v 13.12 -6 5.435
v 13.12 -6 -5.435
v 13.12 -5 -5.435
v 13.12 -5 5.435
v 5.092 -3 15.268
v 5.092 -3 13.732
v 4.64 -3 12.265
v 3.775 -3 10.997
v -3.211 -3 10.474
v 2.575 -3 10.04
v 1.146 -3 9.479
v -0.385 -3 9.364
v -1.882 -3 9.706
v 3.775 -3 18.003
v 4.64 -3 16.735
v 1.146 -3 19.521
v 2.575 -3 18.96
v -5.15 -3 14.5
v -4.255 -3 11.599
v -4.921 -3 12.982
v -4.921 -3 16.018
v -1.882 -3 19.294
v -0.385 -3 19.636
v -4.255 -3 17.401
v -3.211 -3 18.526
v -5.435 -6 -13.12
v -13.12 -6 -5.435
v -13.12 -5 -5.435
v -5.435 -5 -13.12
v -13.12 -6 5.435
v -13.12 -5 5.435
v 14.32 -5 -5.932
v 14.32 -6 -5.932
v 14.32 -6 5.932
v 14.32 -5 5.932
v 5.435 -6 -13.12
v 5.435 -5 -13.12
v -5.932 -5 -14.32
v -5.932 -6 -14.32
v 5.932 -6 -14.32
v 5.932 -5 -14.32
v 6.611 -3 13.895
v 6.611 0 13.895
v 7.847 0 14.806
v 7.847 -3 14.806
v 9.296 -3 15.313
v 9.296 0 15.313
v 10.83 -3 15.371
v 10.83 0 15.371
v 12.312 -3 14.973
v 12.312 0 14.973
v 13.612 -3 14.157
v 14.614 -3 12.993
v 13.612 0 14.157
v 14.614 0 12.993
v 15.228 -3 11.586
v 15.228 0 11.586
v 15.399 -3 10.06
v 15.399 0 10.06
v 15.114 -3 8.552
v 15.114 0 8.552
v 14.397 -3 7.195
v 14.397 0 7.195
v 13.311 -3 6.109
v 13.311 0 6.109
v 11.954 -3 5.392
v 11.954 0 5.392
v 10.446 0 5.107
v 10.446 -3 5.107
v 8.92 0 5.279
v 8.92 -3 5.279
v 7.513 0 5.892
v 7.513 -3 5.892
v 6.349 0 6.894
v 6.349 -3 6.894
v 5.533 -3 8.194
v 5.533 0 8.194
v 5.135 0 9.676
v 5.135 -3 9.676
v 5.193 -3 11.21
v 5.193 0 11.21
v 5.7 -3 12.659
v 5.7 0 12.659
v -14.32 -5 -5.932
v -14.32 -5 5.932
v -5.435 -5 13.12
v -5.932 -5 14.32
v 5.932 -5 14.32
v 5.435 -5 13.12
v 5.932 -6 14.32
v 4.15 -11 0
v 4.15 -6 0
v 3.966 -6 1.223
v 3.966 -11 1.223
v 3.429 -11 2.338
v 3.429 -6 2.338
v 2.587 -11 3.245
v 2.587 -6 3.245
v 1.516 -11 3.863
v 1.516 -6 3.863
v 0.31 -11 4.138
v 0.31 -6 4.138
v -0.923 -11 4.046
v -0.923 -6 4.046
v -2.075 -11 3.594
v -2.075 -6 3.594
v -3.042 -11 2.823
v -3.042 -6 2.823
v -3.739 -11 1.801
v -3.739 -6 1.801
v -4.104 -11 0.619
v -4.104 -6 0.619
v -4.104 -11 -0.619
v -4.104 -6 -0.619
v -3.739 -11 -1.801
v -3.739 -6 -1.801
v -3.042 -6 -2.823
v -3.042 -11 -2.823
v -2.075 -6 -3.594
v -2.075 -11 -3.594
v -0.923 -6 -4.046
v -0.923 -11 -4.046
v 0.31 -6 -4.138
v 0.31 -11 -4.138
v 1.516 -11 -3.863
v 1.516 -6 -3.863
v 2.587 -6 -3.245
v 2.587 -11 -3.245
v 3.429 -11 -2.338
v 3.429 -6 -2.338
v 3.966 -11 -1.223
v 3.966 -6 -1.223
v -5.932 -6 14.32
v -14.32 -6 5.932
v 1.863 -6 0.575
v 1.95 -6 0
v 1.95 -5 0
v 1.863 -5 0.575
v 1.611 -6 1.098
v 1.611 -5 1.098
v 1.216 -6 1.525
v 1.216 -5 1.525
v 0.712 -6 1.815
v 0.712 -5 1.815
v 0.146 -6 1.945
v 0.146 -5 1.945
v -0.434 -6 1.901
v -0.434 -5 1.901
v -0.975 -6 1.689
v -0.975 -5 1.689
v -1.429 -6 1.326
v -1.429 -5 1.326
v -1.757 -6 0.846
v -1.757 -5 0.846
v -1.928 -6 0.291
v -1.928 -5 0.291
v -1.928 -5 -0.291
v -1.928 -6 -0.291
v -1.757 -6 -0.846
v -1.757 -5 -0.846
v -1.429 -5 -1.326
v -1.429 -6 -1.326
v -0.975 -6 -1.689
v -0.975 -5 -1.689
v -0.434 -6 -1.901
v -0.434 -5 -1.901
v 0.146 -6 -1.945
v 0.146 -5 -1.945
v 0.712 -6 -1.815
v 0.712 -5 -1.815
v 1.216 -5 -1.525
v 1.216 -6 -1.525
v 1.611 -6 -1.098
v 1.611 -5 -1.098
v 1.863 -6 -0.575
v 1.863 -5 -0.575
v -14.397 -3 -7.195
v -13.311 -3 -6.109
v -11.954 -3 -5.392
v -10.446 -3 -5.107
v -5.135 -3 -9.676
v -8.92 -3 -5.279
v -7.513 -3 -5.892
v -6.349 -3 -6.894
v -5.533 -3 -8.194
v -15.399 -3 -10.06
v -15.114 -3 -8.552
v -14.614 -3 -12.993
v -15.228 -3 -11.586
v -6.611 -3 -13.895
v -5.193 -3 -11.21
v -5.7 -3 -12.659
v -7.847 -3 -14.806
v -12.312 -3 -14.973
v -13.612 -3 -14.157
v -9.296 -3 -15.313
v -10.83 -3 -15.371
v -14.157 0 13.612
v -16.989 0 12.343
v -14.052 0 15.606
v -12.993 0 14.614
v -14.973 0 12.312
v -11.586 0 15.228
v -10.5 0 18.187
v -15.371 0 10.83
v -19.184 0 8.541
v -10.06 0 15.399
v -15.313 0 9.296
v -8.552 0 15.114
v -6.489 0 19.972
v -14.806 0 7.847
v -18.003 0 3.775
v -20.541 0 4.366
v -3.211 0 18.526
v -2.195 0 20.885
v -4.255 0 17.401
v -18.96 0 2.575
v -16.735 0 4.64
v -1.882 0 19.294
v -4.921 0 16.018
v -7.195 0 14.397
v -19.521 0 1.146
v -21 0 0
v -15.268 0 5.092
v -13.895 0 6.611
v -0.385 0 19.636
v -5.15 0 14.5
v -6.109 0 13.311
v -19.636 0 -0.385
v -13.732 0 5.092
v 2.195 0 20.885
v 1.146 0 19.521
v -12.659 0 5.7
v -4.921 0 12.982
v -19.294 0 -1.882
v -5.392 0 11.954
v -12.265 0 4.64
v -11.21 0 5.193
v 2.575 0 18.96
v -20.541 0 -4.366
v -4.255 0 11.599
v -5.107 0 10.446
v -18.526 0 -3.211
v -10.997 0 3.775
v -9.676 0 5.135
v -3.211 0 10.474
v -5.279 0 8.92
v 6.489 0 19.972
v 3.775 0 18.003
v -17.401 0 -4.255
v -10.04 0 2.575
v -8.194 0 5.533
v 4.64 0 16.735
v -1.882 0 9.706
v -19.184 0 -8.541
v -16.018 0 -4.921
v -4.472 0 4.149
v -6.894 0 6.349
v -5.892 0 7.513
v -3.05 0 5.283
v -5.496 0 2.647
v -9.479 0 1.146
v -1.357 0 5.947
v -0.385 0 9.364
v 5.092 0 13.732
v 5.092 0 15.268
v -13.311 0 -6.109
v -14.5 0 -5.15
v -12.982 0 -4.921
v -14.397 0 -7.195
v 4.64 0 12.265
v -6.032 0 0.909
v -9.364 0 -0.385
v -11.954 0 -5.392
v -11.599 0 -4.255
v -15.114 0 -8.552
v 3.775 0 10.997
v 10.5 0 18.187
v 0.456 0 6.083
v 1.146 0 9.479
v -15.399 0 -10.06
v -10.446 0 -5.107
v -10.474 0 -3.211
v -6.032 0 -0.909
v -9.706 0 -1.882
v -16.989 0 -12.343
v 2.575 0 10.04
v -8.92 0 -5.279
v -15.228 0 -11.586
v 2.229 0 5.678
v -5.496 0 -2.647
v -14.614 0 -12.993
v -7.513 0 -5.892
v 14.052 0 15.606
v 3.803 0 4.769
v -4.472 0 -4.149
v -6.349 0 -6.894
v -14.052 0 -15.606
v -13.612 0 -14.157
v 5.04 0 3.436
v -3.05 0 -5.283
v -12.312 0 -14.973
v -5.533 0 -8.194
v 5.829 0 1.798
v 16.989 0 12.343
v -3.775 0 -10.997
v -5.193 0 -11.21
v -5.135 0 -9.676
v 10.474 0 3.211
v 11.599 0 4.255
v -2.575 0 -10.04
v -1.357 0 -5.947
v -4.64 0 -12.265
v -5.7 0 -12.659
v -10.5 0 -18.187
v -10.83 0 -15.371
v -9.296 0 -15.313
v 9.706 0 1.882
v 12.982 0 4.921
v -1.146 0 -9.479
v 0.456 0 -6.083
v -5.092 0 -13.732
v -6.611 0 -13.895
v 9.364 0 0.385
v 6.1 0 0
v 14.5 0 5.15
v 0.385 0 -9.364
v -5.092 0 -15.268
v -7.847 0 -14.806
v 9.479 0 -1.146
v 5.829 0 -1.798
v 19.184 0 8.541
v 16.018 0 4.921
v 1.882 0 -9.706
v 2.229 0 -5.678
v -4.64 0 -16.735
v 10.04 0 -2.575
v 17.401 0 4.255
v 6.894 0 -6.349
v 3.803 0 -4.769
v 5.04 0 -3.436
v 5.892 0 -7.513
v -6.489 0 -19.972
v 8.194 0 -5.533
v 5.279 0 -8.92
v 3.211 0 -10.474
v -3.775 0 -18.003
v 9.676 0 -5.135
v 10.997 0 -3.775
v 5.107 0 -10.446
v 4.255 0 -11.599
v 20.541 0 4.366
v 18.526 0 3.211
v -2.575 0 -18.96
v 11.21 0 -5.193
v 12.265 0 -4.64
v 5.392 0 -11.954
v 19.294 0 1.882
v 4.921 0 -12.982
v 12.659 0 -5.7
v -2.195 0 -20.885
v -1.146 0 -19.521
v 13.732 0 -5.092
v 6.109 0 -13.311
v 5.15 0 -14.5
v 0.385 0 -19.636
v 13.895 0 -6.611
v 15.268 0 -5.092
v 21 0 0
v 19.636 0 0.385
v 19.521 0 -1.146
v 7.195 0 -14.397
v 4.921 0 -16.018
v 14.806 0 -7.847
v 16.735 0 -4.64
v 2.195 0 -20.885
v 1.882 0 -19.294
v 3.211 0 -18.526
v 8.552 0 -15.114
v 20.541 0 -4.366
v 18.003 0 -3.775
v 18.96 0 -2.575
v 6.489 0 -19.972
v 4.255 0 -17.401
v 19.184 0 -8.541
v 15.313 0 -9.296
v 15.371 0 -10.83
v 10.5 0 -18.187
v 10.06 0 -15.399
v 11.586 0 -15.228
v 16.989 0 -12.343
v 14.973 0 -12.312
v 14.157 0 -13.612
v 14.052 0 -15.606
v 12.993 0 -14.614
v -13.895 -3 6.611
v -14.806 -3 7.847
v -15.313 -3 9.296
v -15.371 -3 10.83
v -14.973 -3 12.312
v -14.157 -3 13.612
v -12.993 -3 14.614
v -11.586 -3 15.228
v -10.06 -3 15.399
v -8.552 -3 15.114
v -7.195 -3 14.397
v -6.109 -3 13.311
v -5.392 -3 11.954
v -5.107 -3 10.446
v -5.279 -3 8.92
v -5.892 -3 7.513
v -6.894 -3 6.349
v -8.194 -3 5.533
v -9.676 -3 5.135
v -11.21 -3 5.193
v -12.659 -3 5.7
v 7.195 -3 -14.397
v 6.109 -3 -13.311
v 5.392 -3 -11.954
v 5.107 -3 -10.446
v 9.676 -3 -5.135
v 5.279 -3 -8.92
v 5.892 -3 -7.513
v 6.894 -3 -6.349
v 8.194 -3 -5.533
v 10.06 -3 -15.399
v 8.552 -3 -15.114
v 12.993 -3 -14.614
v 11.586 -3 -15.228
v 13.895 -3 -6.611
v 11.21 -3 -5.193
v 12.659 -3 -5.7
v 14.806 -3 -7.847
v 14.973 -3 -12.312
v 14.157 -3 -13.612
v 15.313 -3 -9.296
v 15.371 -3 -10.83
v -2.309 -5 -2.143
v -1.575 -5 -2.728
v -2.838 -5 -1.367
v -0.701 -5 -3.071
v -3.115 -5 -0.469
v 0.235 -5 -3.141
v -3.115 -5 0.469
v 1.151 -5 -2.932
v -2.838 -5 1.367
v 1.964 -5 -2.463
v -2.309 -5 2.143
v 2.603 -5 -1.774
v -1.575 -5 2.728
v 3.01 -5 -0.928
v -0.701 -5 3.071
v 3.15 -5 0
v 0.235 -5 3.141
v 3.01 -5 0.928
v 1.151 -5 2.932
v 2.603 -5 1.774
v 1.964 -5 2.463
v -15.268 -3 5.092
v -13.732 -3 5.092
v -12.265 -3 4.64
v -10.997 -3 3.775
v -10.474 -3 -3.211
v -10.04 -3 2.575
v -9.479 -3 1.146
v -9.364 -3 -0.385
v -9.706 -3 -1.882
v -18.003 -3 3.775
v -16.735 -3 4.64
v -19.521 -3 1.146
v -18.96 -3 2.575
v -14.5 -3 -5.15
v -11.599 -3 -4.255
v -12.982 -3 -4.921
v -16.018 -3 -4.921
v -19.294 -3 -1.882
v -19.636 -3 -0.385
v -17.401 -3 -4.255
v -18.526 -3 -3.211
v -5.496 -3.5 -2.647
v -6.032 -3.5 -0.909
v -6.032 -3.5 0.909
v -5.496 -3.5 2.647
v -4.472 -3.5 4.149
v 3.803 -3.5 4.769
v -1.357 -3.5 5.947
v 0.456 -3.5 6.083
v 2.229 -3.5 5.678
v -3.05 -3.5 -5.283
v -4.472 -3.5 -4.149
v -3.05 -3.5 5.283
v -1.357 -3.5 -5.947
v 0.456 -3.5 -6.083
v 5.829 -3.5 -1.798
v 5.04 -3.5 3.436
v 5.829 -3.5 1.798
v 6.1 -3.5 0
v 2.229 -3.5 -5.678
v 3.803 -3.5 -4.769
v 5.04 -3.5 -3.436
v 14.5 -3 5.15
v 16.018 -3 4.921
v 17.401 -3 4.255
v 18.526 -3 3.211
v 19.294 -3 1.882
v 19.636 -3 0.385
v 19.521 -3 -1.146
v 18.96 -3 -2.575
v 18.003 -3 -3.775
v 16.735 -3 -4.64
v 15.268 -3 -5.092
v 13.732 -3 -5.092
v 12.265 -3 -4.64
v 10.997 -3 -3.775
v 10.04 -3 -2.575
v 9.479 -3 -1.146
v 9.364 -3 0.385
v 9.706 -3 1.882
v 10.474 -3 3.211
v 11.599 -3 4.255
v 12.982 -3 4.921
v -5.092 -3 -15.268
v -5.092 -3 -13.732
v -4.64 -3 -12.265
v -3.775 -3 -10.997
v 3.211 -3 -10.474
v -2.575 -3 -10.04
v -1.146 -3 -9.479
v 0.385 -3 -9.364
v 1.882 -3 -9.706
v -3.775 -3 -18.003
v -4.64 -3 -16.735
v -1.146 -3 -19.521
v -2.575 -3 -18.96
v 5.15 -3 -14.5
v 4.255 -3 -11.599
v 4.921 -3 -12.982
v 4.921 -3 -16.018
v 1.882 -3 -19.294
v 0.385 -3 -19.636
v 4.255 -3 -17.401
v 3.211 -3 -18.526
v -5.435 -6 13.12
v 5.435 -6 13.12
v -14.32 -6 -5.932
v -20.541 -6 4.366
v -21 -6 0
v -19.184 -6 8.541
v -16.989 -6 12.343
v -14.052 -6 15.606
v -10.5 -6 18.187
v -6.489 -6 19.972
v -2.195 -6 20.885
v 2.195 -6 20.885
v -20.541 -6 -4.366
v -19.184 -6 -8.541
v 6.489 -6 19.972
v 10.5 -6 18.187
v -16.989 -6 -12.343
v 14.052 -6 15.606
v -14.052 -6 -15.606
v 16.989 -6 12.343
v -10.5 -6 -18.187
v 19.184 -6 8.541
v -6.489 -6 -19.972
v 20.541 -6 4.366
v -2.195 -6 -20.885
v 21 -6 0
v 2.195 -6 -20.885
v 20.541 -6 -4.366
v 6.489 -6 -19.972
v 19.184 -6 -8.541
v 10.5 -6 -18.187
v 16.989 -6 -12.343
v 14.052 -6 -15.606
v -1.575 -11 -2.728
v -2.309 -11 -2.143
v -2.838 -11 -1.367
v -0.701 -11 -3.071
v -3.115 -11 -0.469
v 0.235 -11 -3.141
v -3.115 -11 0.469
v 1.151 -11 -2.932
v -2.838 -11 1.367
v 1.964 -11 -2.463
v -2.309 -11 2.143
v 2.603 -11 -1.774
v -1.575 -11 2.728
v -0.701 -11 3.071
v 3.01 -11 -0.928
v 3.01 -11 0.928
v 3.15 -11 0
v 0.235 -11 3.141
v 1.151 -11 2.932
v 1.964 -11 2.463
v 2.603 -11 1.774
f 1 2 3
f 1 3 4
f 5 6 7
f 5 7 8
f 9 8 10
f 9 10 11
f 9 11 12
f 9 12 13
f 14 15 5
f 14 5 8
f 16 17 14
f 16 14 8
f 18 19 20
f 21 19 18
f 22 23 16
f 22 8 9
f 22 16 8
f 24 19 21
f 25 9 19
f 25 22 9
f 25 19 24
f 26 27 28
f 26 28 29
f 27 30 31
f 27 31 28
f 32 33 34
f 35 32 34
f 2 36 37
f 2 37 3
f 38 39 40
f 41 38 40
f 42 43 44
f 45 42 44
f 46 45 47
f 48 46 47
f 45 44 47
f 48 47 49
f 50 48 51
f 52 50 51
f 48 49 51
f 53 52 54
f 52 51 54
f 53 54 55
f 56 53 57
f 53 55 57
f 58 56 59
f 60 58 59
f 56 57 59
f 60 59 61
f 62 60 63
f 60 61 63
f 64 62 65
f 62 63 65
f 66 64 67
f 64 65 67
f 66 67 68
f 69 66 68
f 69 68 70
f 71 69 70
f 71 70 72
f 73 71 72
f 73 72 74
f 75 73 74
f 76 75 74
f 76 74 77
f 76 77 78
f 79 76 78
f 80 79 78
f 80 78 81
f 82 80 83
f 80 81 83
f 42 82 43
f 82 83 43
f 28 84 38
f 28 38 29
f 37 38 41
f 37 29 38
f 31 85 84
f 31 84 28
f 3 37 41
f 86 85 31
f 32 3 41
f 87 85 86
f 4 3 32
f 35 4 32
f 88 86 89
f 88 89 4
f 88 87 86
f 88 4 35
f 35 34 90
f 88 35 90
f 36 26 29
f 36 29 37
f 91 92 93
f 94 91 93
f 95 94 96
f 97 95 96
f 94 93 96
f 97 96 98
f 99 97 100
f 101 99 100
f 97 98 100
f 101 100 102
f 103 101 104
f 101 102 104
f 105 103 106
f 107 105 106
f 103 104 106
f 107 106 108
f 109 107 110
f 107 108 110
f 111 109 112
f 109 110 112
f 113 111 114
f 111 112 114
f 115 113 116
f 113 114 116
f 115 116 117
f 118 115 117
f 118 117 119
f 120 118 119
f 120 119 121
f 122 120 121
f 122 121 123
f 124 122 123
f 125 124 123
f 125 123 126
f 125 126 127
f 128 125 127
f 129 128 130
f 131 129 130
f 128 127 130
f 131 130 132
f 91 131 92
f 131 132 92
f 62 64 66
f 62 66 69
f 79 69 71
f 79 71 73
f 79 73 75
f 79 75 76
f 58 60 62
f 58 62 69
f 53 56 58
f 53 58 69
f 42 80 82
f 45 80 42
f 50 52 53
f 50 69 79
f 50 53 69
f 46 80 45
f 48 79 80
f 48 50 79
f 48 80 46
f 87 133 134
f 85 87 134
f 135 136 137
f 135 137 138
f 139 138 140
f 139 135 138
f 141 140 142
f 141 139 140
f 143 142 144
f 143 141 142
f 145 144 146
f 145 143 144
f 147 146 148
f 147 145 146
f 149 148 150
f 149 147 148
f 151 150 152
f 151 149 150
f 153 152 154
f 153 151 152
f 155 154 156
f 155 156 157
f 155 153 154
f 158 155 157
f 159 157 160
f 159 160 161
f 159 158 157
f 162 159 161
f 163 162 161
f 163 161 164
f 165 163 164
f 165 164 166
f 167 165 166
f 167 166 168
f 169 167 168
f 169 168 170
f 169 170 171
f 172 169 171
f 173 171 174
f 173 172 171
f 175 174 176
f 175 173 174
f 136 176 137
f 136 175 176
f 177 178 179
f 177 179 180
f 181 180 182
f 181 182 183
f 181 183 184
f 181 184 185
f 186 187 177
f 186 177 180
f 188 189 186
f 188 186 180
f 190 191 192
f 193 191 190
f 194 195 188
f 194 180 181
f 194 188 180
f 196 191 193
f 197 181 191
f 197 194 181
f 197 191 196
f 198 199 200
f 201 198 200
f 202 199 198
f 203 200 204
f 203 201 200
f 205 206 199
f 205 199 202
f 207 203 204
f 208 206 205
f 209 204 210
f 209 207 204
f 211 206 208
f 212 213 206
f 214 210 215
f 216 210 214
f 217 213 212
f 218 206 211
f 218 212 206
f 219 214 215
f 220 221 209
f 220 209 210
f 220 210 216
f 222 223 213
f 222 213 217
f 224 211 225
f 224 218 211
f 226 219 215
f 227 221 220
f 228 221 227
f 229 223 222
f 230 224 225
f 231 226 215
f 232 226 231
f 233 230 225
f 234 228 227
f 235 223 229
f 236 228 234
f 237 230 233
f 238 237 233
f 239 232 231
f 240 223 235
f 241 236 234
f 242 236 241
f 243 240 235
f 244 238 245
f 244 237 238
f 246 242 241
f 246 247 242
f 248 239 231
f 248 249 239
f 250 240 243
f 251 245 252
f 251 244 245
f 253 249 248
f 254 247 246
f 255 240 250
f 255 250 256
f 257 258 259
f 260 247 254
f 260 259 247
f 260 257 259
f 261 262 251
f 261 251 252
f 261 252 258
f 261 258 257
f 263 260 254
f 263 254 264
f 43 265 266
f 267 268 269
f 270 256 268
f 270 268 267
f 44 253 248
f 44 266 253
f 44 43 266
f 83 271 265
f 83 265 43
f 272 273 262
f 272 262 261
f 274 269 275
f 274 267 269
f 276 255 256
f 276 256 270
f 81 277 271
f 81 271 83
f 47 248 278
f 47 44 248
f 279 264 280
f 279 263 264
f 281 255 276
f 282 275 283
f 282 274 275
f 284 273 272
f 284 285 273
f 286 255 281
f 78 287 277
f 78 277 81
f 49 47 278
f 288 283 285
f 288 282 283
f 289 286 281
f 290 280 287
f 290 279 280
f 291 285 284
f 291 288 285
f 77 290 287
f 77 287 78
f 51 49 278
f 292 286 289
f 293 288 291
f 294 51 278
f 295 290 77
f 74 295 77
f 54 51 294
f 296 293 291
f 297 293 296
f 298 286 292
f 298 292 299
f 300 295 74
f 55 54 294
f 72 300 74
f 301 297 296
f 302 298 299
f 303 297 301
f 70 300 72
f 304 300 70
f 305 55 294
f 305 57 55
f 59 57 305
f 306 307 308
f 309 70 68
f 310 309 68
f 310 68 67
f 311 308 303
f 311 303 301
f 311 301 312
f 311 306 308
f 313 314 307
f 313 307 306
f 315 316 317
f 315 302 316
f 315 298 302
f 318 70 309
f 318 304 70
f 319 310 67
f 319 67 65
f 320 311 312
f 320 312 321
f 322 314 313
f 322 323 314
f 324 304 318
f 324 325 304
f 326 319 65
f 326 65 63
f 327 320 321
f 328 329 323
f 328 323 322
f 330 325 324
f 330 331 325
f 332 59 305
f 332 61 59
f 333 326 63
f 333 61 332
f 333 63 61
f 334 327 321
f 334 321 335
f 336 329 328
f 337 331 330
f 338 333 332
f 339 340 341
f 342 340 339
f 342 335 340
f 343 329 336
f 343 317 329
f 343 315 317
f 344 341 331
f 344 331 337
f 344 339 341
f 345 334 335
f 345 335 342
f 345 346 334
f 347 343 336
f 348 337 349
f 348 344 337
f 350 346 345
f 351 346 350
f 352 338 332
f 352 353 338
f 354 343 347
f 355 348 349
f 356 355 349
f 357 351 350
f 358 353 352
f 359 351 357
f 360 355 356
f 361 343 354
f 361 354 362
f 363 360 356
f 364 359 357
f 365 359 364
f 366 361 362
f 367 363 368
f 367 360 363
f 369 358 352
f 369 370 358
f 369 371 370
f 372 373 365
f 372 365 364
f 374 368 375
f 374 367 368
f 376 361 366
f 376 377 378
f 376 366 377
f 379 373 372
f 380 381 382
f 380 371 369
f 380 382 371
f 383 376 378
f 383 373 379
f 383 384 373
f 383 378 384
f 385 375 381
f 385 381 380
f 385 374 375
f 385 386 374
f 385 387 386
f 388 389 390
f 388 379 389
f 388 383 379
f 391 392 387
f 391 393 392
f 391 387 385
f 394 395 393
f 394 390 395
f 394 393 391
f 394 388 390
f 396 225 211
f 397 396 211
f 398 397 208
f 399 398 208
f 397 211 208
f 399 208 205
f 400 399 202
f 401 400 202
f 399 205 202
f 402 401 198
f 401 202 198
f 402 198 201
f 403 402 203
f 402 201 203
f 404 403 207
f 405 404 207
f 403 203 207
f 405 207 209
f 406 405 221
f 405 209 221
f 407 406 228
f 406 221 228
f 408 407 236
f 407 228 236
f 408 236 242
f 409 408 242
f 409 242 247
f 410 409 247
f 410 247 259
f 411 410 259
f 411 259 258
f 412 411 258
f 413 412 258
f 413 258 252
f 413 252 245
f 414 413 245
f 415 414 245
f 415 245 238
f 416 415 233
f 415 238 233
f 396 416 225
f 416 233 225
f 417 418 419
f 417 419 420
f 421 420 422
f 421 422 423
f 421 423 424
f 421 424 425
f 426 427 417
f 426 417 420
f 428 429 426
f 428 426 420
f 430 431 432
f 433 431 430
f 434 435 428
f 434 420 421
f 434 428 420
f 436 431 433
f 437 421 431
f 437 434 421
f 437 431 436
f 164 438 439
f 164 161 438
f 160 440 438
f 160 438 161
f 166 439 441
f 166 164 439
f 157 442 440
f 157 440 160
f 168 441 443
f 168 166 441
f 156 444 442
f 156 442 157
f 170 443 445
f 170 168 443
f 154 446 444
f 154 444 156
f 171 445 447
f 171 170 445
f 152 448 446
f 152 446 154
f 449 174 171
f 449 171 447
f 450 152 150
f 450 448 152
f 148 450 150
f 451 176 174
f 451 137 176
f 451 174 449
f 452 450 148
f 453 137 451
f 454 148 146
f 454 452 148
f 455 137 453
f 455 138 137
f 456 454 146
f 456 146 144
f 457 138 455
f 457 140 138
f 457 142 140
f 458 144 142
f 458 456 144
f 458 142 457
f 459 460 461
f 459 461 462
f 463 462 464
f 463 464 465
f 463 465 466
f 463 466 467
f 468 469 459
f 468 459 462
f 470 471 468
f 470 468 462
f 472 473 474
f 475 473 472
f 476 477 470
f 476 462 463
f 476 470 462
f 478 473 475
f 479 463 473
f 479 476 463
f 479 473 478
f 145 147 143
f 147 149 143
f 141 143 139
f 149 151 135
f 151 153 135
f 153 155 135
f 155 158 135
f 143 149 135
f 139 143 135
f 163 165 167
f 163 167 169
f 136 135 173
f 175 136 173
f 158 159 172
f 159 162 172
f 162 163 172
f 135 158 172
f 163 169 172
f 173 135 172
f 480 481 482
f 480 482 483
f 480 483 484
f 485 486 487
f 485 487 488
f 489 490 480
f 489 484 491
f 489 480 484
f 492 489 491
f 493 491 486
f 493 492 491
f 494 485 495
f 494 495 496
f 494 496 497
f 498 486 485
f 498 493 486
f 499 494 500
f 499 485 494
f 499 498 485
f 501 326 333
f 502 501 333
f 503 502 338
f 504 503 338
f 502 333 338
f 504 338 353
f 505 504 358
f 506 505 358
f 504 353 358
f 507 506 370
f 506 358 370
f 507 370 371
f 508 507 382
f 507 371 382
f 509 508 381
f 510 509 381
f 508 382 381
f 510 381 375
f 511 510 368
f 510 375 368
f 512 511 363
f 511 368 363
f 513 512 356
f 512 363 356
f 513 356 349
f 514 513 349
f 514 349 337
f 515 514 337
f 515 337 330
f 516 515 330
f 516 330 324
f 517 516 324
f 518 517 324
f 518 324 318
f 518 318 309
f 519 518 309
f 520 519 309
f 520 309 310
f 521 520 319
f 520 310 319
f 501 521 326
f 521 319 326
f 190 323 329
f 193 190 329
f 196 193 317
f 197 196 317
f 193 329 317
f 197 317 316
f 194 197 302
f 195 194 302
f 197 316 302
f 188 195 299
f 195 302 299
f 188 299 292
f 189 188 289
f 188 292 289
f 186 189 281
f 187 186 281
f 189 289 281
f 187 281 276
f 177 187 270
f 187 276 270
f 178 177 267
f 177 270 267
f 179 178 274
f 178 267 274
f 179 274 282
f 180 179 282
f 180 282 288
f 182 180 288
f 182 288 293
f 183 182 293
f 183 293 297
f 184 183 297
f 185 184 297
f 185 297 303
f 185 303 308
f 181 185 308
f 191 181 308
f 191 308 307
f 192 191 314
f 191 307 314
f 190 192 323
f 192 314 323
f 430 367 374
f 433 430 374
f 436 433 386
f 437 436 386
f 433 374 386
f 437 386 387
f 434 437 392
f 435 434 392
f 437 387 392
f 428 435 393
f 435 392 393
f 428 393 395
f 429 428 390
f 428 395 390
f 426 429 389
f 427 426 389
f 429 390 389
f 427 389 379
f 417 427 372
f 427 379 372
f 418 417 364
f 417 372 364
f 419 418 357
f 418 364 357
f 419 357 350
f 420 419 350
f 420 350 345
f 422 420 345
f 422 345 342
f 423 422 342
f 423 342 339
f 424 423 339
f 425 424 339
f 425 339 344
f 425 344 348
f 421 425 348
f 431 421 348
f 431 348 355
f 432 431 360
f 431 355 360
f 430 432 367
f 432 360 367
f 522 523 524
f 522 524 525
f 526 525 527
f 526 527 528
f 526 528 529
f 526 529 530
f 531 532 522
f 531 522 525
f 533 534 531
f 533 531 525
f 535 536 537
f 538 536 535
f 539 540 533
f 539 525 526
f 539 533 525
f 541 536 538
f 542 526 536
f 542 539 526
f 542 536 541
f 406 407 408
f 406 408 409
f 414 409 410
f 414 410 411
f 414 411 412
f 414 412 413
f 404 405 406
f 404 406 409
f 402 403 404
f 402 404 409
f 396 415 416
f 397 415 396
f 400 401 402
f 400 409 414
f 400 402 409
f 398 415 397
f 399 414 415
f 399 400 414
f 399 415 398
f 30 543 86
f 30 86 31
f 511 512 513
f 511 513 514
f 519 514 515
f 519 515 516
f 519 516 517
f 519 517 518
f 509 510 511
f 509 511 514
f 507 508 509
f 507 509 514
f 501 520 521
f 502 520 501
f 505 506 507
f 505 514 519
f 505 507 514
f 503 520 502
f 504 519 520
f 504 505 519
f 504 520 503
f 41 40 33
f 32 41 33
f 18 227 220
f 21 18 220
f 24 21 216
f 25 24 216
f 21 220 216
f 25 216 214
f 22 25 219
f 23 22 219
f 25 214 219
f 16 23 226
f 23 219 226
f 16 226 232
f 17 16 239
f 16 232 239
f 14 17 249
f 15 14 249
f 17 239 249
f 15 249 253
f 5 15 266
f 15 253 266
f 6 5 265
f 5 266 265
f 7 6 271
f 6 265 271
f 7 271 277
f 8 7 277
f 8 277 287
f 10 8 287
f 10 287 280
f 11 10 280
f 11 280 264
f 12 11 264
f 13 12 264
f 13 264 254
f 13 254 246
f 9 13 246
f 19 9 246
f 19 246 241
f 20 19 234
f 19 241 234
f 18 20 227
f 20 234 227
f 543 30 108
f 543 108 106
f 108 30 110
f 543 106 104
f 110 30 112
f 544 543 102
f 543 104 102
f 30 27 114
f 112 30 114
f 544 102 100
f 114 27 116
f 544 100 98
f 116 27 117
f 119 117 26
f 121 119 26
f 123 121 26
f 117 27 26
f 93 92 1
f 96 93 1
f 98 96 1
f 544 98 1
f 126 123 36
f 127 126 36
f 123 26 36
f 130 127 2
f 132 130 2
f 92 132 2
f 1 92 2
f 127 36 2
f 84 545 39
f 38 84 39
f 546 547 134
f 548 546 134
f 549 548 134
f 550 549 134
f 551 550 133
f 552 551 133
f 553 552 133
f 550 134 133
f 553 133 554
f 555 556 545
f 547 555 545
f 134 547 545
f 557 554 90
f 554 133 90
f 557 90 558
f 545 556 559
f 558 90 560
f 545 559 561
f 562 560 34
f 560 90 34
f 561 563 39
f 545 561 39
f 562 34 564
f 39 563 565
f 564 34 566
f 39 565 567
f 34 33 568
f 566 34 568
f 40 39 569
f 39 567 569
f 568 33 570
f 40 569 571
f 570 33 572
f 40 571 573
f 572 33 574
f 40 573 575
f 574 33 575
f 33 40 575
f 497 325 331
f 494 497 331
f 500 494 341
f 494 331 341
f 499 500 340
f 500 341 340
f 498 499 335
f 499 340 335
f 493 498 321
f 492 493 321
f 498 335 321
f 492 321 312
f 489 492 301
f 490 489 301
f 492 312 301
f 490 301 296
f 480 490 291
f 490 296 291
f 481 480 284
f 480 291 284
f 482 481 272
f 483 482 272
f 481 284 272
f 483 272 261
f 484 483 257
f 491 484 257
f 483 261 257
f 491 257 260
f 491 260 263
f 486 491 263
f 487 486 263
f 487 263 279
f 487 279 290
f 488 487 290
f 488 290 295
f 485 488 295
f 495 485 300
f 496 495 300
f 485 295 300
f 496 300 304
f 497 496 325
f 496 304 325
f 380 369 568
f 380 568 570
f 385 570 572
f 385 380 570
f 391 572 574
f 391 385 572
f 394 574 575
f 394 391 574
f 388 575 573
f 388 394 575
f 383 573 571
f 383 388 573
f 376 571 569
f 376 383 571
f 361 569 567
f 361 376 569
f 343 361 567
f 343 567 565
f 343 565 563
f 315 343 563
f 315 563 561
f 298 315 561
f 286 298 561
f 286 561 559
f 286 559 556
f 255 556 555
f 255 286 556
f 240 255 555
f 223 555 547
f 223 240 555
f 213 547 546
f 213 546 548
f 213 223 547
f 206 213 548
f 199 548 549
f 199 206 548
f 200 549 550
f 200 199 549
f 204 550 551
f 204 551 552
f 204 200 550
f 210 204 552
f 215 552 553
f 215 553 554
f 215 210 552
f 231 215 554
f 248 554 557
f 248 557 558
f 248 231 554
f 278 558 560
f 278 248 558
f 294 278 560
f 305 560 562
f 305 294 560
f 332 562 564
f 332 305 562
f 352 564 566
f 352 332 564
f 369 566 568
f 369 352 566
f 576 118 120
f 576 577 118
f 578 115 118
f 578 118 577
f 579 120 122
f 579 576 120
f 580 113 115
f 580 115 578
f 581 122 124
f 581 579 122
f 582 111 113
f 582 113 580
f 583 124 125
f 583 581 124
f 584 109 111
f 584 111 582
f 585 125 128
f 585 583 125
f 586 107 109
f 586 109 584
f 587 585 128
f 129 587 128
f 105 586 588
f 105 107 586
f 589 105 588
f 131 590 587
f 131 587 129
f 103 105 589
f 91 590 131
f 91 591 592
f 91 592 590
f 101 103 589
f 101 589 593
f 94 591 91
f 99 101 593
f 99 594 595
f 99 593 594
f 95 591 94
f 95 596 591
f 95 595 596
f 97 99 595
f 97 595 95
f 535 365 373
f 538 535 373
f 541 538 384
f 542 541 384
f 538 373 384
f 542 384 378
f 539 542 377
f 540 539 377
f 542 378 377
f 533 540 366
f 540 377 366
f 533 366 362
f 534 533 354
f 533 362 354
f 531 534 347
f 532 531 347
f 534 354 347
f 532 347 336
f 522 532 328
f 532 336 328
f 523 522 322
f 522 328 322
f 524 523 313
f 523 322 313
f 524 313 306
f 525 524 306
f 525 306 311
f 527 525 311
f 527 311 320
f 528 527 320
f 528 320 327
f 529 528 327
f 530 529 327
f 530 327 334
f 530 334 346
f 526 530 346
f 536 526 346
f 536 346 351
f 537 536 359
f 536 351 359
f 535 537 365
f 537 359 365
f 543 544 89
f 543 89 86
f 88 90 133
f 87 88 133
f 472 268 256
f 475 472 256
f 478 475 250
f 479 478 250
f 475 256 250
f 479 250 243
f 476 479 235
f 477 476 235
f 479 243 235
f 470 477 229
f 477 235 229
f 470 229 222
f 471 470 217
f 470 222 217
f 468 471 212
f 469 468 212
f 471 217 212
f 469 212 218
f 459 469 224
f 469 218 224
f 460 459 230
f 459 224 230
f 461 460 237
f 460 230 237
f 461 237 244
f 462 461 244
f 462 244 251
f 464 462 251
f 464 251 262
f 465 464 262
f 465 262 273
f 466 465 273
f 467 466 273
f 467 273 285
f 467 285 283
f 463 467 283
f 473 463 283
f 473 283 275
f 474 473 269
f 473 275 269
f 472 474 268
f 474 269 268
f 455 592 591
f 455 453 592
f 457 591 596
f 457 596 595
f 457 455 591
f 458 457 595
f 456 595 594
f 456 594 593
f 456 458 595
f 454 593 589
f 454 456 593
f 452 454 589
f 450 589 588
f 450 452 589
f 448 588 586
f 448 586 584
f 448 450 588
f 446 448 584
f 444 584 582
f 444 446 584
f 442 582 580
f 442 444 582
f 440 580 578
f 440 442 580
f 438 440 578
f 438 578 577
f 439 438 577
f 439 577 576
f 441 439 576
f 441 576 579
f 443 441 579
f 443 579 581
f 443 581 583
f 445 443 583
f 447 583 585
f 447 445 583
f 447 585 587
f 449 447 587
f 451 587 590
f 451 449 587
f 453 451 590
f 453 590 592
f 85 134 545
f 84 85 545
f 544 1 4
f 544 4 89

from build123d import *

# Parameters (mm, degrees)
SKETCH_1_R               = 21
EXTRUDE_9_DEPTH          = 6
SKETCH_2_R               = 5.15
CUT_EXTRUDE_11_DEPTH     = 3
PATTERN_CIRCULAR_4_COUNT = 8
CUT_EXTRUDE_12_DEPTH     = 1
SKETCH_4_R               = 6.1
CUT_EXTRUDE_13_DEPTH     = 3.5
SKETCH_5_R               = 3.15
SKETCH_5_R_2             = 1.95
CUT_EXTRUDE_14_DEPTH     = 1
SKETCH_6_R               = 4.15
SKETCH_6_R_2             = 3.15
EXTRUDE_10_DEPTH         = 5


with BuildPart() as part:
    # 스케치1 → 보스-돌출9 (new body)
    with BuildSketch(Plane(origin=(0, 0, 0), x_dir=(1, 0, 0), z_dir=(0, 1, 0))):
        Circle(SKETCH_1_R)
    extrude(amount=-EXTRUDE_9_DEPTH)

    # 스케치2 → 컷-돌출11 (cut)
    with BuildSketch(Plane(origin=(0, 0, 0), x_dir=(1, 0, 0), z_dir=(0, 1, 0))):
        with Locations((0, 14.5)):
            Circle(SKETCH_2_R)
    cut_extrude_11 = extrude(amount=-CUT_EXTRUDE_11_DEPTH, mode=Mode.SUBTRACT)

    # 원형 패턴4: 컷-돌출11 ×8 about axis
    pattern_circular_4_axis = Axis((0, 0, 0), (0, 1, 0))
    for i in range(1, PATTERN_CIRCULAR_4_COUNT):
        add(cut_extrude_11.rotate(pattern_circular_4_axis, i * 360 / PATTERN_CIRCULAR_4_COUNT), mode=Mode.SUBTRACT)

    # 스케치3 → 컷-돌출12 (cut)
    with BuildSketch(Plane.XZ.offset(6)):
        Polygon((-14.320132754, -5.931593202), (-5.931593202, -14.320132754), (5.931593202, -14.320132754), (14.320132754, -5.931593202), (14.320132754, 5.931593202), (5.931593202, 14.320132754), (-5.931593202, 14.320132754), (-14.320132754, 5.931593202), align=None)
        Polygon((-5.434536927, -13.120132754), (5.434536927, -13.120132754), (13.120132754, -5.434536927), (13.120132754, 5.434536927), (5.434536927, 13.120132754), (-5.434536927, 13.120132754), (-13.120132754, 5.434536927), (-13.120132754, -5.434536927), align=None, mode=Mode.SUBTRACT)
    extrude(amount=-CUT_EXTRUDE_12_DEPTH, mode=Mode.SUBTRACT)

    # 스케치4 → 컷-돌출13 (cut)
    with BuildSketch(Plane(origin=(0, 0, 0), x_dir=(1, 0, 0), z_dir=(0, 1, 0))):
        Circle(SKETCH_4_R)
    extrude(amount=-CUT_EXTRUDE_13_DEPTH, mode=Mode.SUBTRACT)

    # 스케치5 → 컷-돌출14 (cut)
    with BuildSketch(Plane.XZ.offset(6)):
        Circle(SKETCH_5_R)
        Circle(SKETCH_5_R_2, mode=Mode.SUBTRACT)
    extrude(amount=-CUT_EXTRUDE_14_DEPTH, mode=Mode.SUBTRACT)

    # 스케치6 → 보스-돌출10 (add)
    with BuildSketch(Plane.XZ.offset(6)):
        Circle(SKETCH_6_R)
        Circle(SKETCH_6_R_2, mode=Mode.SUBTRACT)
    extrude(amount=EXTRUDE_10_DEPTH)


solid = part.part
